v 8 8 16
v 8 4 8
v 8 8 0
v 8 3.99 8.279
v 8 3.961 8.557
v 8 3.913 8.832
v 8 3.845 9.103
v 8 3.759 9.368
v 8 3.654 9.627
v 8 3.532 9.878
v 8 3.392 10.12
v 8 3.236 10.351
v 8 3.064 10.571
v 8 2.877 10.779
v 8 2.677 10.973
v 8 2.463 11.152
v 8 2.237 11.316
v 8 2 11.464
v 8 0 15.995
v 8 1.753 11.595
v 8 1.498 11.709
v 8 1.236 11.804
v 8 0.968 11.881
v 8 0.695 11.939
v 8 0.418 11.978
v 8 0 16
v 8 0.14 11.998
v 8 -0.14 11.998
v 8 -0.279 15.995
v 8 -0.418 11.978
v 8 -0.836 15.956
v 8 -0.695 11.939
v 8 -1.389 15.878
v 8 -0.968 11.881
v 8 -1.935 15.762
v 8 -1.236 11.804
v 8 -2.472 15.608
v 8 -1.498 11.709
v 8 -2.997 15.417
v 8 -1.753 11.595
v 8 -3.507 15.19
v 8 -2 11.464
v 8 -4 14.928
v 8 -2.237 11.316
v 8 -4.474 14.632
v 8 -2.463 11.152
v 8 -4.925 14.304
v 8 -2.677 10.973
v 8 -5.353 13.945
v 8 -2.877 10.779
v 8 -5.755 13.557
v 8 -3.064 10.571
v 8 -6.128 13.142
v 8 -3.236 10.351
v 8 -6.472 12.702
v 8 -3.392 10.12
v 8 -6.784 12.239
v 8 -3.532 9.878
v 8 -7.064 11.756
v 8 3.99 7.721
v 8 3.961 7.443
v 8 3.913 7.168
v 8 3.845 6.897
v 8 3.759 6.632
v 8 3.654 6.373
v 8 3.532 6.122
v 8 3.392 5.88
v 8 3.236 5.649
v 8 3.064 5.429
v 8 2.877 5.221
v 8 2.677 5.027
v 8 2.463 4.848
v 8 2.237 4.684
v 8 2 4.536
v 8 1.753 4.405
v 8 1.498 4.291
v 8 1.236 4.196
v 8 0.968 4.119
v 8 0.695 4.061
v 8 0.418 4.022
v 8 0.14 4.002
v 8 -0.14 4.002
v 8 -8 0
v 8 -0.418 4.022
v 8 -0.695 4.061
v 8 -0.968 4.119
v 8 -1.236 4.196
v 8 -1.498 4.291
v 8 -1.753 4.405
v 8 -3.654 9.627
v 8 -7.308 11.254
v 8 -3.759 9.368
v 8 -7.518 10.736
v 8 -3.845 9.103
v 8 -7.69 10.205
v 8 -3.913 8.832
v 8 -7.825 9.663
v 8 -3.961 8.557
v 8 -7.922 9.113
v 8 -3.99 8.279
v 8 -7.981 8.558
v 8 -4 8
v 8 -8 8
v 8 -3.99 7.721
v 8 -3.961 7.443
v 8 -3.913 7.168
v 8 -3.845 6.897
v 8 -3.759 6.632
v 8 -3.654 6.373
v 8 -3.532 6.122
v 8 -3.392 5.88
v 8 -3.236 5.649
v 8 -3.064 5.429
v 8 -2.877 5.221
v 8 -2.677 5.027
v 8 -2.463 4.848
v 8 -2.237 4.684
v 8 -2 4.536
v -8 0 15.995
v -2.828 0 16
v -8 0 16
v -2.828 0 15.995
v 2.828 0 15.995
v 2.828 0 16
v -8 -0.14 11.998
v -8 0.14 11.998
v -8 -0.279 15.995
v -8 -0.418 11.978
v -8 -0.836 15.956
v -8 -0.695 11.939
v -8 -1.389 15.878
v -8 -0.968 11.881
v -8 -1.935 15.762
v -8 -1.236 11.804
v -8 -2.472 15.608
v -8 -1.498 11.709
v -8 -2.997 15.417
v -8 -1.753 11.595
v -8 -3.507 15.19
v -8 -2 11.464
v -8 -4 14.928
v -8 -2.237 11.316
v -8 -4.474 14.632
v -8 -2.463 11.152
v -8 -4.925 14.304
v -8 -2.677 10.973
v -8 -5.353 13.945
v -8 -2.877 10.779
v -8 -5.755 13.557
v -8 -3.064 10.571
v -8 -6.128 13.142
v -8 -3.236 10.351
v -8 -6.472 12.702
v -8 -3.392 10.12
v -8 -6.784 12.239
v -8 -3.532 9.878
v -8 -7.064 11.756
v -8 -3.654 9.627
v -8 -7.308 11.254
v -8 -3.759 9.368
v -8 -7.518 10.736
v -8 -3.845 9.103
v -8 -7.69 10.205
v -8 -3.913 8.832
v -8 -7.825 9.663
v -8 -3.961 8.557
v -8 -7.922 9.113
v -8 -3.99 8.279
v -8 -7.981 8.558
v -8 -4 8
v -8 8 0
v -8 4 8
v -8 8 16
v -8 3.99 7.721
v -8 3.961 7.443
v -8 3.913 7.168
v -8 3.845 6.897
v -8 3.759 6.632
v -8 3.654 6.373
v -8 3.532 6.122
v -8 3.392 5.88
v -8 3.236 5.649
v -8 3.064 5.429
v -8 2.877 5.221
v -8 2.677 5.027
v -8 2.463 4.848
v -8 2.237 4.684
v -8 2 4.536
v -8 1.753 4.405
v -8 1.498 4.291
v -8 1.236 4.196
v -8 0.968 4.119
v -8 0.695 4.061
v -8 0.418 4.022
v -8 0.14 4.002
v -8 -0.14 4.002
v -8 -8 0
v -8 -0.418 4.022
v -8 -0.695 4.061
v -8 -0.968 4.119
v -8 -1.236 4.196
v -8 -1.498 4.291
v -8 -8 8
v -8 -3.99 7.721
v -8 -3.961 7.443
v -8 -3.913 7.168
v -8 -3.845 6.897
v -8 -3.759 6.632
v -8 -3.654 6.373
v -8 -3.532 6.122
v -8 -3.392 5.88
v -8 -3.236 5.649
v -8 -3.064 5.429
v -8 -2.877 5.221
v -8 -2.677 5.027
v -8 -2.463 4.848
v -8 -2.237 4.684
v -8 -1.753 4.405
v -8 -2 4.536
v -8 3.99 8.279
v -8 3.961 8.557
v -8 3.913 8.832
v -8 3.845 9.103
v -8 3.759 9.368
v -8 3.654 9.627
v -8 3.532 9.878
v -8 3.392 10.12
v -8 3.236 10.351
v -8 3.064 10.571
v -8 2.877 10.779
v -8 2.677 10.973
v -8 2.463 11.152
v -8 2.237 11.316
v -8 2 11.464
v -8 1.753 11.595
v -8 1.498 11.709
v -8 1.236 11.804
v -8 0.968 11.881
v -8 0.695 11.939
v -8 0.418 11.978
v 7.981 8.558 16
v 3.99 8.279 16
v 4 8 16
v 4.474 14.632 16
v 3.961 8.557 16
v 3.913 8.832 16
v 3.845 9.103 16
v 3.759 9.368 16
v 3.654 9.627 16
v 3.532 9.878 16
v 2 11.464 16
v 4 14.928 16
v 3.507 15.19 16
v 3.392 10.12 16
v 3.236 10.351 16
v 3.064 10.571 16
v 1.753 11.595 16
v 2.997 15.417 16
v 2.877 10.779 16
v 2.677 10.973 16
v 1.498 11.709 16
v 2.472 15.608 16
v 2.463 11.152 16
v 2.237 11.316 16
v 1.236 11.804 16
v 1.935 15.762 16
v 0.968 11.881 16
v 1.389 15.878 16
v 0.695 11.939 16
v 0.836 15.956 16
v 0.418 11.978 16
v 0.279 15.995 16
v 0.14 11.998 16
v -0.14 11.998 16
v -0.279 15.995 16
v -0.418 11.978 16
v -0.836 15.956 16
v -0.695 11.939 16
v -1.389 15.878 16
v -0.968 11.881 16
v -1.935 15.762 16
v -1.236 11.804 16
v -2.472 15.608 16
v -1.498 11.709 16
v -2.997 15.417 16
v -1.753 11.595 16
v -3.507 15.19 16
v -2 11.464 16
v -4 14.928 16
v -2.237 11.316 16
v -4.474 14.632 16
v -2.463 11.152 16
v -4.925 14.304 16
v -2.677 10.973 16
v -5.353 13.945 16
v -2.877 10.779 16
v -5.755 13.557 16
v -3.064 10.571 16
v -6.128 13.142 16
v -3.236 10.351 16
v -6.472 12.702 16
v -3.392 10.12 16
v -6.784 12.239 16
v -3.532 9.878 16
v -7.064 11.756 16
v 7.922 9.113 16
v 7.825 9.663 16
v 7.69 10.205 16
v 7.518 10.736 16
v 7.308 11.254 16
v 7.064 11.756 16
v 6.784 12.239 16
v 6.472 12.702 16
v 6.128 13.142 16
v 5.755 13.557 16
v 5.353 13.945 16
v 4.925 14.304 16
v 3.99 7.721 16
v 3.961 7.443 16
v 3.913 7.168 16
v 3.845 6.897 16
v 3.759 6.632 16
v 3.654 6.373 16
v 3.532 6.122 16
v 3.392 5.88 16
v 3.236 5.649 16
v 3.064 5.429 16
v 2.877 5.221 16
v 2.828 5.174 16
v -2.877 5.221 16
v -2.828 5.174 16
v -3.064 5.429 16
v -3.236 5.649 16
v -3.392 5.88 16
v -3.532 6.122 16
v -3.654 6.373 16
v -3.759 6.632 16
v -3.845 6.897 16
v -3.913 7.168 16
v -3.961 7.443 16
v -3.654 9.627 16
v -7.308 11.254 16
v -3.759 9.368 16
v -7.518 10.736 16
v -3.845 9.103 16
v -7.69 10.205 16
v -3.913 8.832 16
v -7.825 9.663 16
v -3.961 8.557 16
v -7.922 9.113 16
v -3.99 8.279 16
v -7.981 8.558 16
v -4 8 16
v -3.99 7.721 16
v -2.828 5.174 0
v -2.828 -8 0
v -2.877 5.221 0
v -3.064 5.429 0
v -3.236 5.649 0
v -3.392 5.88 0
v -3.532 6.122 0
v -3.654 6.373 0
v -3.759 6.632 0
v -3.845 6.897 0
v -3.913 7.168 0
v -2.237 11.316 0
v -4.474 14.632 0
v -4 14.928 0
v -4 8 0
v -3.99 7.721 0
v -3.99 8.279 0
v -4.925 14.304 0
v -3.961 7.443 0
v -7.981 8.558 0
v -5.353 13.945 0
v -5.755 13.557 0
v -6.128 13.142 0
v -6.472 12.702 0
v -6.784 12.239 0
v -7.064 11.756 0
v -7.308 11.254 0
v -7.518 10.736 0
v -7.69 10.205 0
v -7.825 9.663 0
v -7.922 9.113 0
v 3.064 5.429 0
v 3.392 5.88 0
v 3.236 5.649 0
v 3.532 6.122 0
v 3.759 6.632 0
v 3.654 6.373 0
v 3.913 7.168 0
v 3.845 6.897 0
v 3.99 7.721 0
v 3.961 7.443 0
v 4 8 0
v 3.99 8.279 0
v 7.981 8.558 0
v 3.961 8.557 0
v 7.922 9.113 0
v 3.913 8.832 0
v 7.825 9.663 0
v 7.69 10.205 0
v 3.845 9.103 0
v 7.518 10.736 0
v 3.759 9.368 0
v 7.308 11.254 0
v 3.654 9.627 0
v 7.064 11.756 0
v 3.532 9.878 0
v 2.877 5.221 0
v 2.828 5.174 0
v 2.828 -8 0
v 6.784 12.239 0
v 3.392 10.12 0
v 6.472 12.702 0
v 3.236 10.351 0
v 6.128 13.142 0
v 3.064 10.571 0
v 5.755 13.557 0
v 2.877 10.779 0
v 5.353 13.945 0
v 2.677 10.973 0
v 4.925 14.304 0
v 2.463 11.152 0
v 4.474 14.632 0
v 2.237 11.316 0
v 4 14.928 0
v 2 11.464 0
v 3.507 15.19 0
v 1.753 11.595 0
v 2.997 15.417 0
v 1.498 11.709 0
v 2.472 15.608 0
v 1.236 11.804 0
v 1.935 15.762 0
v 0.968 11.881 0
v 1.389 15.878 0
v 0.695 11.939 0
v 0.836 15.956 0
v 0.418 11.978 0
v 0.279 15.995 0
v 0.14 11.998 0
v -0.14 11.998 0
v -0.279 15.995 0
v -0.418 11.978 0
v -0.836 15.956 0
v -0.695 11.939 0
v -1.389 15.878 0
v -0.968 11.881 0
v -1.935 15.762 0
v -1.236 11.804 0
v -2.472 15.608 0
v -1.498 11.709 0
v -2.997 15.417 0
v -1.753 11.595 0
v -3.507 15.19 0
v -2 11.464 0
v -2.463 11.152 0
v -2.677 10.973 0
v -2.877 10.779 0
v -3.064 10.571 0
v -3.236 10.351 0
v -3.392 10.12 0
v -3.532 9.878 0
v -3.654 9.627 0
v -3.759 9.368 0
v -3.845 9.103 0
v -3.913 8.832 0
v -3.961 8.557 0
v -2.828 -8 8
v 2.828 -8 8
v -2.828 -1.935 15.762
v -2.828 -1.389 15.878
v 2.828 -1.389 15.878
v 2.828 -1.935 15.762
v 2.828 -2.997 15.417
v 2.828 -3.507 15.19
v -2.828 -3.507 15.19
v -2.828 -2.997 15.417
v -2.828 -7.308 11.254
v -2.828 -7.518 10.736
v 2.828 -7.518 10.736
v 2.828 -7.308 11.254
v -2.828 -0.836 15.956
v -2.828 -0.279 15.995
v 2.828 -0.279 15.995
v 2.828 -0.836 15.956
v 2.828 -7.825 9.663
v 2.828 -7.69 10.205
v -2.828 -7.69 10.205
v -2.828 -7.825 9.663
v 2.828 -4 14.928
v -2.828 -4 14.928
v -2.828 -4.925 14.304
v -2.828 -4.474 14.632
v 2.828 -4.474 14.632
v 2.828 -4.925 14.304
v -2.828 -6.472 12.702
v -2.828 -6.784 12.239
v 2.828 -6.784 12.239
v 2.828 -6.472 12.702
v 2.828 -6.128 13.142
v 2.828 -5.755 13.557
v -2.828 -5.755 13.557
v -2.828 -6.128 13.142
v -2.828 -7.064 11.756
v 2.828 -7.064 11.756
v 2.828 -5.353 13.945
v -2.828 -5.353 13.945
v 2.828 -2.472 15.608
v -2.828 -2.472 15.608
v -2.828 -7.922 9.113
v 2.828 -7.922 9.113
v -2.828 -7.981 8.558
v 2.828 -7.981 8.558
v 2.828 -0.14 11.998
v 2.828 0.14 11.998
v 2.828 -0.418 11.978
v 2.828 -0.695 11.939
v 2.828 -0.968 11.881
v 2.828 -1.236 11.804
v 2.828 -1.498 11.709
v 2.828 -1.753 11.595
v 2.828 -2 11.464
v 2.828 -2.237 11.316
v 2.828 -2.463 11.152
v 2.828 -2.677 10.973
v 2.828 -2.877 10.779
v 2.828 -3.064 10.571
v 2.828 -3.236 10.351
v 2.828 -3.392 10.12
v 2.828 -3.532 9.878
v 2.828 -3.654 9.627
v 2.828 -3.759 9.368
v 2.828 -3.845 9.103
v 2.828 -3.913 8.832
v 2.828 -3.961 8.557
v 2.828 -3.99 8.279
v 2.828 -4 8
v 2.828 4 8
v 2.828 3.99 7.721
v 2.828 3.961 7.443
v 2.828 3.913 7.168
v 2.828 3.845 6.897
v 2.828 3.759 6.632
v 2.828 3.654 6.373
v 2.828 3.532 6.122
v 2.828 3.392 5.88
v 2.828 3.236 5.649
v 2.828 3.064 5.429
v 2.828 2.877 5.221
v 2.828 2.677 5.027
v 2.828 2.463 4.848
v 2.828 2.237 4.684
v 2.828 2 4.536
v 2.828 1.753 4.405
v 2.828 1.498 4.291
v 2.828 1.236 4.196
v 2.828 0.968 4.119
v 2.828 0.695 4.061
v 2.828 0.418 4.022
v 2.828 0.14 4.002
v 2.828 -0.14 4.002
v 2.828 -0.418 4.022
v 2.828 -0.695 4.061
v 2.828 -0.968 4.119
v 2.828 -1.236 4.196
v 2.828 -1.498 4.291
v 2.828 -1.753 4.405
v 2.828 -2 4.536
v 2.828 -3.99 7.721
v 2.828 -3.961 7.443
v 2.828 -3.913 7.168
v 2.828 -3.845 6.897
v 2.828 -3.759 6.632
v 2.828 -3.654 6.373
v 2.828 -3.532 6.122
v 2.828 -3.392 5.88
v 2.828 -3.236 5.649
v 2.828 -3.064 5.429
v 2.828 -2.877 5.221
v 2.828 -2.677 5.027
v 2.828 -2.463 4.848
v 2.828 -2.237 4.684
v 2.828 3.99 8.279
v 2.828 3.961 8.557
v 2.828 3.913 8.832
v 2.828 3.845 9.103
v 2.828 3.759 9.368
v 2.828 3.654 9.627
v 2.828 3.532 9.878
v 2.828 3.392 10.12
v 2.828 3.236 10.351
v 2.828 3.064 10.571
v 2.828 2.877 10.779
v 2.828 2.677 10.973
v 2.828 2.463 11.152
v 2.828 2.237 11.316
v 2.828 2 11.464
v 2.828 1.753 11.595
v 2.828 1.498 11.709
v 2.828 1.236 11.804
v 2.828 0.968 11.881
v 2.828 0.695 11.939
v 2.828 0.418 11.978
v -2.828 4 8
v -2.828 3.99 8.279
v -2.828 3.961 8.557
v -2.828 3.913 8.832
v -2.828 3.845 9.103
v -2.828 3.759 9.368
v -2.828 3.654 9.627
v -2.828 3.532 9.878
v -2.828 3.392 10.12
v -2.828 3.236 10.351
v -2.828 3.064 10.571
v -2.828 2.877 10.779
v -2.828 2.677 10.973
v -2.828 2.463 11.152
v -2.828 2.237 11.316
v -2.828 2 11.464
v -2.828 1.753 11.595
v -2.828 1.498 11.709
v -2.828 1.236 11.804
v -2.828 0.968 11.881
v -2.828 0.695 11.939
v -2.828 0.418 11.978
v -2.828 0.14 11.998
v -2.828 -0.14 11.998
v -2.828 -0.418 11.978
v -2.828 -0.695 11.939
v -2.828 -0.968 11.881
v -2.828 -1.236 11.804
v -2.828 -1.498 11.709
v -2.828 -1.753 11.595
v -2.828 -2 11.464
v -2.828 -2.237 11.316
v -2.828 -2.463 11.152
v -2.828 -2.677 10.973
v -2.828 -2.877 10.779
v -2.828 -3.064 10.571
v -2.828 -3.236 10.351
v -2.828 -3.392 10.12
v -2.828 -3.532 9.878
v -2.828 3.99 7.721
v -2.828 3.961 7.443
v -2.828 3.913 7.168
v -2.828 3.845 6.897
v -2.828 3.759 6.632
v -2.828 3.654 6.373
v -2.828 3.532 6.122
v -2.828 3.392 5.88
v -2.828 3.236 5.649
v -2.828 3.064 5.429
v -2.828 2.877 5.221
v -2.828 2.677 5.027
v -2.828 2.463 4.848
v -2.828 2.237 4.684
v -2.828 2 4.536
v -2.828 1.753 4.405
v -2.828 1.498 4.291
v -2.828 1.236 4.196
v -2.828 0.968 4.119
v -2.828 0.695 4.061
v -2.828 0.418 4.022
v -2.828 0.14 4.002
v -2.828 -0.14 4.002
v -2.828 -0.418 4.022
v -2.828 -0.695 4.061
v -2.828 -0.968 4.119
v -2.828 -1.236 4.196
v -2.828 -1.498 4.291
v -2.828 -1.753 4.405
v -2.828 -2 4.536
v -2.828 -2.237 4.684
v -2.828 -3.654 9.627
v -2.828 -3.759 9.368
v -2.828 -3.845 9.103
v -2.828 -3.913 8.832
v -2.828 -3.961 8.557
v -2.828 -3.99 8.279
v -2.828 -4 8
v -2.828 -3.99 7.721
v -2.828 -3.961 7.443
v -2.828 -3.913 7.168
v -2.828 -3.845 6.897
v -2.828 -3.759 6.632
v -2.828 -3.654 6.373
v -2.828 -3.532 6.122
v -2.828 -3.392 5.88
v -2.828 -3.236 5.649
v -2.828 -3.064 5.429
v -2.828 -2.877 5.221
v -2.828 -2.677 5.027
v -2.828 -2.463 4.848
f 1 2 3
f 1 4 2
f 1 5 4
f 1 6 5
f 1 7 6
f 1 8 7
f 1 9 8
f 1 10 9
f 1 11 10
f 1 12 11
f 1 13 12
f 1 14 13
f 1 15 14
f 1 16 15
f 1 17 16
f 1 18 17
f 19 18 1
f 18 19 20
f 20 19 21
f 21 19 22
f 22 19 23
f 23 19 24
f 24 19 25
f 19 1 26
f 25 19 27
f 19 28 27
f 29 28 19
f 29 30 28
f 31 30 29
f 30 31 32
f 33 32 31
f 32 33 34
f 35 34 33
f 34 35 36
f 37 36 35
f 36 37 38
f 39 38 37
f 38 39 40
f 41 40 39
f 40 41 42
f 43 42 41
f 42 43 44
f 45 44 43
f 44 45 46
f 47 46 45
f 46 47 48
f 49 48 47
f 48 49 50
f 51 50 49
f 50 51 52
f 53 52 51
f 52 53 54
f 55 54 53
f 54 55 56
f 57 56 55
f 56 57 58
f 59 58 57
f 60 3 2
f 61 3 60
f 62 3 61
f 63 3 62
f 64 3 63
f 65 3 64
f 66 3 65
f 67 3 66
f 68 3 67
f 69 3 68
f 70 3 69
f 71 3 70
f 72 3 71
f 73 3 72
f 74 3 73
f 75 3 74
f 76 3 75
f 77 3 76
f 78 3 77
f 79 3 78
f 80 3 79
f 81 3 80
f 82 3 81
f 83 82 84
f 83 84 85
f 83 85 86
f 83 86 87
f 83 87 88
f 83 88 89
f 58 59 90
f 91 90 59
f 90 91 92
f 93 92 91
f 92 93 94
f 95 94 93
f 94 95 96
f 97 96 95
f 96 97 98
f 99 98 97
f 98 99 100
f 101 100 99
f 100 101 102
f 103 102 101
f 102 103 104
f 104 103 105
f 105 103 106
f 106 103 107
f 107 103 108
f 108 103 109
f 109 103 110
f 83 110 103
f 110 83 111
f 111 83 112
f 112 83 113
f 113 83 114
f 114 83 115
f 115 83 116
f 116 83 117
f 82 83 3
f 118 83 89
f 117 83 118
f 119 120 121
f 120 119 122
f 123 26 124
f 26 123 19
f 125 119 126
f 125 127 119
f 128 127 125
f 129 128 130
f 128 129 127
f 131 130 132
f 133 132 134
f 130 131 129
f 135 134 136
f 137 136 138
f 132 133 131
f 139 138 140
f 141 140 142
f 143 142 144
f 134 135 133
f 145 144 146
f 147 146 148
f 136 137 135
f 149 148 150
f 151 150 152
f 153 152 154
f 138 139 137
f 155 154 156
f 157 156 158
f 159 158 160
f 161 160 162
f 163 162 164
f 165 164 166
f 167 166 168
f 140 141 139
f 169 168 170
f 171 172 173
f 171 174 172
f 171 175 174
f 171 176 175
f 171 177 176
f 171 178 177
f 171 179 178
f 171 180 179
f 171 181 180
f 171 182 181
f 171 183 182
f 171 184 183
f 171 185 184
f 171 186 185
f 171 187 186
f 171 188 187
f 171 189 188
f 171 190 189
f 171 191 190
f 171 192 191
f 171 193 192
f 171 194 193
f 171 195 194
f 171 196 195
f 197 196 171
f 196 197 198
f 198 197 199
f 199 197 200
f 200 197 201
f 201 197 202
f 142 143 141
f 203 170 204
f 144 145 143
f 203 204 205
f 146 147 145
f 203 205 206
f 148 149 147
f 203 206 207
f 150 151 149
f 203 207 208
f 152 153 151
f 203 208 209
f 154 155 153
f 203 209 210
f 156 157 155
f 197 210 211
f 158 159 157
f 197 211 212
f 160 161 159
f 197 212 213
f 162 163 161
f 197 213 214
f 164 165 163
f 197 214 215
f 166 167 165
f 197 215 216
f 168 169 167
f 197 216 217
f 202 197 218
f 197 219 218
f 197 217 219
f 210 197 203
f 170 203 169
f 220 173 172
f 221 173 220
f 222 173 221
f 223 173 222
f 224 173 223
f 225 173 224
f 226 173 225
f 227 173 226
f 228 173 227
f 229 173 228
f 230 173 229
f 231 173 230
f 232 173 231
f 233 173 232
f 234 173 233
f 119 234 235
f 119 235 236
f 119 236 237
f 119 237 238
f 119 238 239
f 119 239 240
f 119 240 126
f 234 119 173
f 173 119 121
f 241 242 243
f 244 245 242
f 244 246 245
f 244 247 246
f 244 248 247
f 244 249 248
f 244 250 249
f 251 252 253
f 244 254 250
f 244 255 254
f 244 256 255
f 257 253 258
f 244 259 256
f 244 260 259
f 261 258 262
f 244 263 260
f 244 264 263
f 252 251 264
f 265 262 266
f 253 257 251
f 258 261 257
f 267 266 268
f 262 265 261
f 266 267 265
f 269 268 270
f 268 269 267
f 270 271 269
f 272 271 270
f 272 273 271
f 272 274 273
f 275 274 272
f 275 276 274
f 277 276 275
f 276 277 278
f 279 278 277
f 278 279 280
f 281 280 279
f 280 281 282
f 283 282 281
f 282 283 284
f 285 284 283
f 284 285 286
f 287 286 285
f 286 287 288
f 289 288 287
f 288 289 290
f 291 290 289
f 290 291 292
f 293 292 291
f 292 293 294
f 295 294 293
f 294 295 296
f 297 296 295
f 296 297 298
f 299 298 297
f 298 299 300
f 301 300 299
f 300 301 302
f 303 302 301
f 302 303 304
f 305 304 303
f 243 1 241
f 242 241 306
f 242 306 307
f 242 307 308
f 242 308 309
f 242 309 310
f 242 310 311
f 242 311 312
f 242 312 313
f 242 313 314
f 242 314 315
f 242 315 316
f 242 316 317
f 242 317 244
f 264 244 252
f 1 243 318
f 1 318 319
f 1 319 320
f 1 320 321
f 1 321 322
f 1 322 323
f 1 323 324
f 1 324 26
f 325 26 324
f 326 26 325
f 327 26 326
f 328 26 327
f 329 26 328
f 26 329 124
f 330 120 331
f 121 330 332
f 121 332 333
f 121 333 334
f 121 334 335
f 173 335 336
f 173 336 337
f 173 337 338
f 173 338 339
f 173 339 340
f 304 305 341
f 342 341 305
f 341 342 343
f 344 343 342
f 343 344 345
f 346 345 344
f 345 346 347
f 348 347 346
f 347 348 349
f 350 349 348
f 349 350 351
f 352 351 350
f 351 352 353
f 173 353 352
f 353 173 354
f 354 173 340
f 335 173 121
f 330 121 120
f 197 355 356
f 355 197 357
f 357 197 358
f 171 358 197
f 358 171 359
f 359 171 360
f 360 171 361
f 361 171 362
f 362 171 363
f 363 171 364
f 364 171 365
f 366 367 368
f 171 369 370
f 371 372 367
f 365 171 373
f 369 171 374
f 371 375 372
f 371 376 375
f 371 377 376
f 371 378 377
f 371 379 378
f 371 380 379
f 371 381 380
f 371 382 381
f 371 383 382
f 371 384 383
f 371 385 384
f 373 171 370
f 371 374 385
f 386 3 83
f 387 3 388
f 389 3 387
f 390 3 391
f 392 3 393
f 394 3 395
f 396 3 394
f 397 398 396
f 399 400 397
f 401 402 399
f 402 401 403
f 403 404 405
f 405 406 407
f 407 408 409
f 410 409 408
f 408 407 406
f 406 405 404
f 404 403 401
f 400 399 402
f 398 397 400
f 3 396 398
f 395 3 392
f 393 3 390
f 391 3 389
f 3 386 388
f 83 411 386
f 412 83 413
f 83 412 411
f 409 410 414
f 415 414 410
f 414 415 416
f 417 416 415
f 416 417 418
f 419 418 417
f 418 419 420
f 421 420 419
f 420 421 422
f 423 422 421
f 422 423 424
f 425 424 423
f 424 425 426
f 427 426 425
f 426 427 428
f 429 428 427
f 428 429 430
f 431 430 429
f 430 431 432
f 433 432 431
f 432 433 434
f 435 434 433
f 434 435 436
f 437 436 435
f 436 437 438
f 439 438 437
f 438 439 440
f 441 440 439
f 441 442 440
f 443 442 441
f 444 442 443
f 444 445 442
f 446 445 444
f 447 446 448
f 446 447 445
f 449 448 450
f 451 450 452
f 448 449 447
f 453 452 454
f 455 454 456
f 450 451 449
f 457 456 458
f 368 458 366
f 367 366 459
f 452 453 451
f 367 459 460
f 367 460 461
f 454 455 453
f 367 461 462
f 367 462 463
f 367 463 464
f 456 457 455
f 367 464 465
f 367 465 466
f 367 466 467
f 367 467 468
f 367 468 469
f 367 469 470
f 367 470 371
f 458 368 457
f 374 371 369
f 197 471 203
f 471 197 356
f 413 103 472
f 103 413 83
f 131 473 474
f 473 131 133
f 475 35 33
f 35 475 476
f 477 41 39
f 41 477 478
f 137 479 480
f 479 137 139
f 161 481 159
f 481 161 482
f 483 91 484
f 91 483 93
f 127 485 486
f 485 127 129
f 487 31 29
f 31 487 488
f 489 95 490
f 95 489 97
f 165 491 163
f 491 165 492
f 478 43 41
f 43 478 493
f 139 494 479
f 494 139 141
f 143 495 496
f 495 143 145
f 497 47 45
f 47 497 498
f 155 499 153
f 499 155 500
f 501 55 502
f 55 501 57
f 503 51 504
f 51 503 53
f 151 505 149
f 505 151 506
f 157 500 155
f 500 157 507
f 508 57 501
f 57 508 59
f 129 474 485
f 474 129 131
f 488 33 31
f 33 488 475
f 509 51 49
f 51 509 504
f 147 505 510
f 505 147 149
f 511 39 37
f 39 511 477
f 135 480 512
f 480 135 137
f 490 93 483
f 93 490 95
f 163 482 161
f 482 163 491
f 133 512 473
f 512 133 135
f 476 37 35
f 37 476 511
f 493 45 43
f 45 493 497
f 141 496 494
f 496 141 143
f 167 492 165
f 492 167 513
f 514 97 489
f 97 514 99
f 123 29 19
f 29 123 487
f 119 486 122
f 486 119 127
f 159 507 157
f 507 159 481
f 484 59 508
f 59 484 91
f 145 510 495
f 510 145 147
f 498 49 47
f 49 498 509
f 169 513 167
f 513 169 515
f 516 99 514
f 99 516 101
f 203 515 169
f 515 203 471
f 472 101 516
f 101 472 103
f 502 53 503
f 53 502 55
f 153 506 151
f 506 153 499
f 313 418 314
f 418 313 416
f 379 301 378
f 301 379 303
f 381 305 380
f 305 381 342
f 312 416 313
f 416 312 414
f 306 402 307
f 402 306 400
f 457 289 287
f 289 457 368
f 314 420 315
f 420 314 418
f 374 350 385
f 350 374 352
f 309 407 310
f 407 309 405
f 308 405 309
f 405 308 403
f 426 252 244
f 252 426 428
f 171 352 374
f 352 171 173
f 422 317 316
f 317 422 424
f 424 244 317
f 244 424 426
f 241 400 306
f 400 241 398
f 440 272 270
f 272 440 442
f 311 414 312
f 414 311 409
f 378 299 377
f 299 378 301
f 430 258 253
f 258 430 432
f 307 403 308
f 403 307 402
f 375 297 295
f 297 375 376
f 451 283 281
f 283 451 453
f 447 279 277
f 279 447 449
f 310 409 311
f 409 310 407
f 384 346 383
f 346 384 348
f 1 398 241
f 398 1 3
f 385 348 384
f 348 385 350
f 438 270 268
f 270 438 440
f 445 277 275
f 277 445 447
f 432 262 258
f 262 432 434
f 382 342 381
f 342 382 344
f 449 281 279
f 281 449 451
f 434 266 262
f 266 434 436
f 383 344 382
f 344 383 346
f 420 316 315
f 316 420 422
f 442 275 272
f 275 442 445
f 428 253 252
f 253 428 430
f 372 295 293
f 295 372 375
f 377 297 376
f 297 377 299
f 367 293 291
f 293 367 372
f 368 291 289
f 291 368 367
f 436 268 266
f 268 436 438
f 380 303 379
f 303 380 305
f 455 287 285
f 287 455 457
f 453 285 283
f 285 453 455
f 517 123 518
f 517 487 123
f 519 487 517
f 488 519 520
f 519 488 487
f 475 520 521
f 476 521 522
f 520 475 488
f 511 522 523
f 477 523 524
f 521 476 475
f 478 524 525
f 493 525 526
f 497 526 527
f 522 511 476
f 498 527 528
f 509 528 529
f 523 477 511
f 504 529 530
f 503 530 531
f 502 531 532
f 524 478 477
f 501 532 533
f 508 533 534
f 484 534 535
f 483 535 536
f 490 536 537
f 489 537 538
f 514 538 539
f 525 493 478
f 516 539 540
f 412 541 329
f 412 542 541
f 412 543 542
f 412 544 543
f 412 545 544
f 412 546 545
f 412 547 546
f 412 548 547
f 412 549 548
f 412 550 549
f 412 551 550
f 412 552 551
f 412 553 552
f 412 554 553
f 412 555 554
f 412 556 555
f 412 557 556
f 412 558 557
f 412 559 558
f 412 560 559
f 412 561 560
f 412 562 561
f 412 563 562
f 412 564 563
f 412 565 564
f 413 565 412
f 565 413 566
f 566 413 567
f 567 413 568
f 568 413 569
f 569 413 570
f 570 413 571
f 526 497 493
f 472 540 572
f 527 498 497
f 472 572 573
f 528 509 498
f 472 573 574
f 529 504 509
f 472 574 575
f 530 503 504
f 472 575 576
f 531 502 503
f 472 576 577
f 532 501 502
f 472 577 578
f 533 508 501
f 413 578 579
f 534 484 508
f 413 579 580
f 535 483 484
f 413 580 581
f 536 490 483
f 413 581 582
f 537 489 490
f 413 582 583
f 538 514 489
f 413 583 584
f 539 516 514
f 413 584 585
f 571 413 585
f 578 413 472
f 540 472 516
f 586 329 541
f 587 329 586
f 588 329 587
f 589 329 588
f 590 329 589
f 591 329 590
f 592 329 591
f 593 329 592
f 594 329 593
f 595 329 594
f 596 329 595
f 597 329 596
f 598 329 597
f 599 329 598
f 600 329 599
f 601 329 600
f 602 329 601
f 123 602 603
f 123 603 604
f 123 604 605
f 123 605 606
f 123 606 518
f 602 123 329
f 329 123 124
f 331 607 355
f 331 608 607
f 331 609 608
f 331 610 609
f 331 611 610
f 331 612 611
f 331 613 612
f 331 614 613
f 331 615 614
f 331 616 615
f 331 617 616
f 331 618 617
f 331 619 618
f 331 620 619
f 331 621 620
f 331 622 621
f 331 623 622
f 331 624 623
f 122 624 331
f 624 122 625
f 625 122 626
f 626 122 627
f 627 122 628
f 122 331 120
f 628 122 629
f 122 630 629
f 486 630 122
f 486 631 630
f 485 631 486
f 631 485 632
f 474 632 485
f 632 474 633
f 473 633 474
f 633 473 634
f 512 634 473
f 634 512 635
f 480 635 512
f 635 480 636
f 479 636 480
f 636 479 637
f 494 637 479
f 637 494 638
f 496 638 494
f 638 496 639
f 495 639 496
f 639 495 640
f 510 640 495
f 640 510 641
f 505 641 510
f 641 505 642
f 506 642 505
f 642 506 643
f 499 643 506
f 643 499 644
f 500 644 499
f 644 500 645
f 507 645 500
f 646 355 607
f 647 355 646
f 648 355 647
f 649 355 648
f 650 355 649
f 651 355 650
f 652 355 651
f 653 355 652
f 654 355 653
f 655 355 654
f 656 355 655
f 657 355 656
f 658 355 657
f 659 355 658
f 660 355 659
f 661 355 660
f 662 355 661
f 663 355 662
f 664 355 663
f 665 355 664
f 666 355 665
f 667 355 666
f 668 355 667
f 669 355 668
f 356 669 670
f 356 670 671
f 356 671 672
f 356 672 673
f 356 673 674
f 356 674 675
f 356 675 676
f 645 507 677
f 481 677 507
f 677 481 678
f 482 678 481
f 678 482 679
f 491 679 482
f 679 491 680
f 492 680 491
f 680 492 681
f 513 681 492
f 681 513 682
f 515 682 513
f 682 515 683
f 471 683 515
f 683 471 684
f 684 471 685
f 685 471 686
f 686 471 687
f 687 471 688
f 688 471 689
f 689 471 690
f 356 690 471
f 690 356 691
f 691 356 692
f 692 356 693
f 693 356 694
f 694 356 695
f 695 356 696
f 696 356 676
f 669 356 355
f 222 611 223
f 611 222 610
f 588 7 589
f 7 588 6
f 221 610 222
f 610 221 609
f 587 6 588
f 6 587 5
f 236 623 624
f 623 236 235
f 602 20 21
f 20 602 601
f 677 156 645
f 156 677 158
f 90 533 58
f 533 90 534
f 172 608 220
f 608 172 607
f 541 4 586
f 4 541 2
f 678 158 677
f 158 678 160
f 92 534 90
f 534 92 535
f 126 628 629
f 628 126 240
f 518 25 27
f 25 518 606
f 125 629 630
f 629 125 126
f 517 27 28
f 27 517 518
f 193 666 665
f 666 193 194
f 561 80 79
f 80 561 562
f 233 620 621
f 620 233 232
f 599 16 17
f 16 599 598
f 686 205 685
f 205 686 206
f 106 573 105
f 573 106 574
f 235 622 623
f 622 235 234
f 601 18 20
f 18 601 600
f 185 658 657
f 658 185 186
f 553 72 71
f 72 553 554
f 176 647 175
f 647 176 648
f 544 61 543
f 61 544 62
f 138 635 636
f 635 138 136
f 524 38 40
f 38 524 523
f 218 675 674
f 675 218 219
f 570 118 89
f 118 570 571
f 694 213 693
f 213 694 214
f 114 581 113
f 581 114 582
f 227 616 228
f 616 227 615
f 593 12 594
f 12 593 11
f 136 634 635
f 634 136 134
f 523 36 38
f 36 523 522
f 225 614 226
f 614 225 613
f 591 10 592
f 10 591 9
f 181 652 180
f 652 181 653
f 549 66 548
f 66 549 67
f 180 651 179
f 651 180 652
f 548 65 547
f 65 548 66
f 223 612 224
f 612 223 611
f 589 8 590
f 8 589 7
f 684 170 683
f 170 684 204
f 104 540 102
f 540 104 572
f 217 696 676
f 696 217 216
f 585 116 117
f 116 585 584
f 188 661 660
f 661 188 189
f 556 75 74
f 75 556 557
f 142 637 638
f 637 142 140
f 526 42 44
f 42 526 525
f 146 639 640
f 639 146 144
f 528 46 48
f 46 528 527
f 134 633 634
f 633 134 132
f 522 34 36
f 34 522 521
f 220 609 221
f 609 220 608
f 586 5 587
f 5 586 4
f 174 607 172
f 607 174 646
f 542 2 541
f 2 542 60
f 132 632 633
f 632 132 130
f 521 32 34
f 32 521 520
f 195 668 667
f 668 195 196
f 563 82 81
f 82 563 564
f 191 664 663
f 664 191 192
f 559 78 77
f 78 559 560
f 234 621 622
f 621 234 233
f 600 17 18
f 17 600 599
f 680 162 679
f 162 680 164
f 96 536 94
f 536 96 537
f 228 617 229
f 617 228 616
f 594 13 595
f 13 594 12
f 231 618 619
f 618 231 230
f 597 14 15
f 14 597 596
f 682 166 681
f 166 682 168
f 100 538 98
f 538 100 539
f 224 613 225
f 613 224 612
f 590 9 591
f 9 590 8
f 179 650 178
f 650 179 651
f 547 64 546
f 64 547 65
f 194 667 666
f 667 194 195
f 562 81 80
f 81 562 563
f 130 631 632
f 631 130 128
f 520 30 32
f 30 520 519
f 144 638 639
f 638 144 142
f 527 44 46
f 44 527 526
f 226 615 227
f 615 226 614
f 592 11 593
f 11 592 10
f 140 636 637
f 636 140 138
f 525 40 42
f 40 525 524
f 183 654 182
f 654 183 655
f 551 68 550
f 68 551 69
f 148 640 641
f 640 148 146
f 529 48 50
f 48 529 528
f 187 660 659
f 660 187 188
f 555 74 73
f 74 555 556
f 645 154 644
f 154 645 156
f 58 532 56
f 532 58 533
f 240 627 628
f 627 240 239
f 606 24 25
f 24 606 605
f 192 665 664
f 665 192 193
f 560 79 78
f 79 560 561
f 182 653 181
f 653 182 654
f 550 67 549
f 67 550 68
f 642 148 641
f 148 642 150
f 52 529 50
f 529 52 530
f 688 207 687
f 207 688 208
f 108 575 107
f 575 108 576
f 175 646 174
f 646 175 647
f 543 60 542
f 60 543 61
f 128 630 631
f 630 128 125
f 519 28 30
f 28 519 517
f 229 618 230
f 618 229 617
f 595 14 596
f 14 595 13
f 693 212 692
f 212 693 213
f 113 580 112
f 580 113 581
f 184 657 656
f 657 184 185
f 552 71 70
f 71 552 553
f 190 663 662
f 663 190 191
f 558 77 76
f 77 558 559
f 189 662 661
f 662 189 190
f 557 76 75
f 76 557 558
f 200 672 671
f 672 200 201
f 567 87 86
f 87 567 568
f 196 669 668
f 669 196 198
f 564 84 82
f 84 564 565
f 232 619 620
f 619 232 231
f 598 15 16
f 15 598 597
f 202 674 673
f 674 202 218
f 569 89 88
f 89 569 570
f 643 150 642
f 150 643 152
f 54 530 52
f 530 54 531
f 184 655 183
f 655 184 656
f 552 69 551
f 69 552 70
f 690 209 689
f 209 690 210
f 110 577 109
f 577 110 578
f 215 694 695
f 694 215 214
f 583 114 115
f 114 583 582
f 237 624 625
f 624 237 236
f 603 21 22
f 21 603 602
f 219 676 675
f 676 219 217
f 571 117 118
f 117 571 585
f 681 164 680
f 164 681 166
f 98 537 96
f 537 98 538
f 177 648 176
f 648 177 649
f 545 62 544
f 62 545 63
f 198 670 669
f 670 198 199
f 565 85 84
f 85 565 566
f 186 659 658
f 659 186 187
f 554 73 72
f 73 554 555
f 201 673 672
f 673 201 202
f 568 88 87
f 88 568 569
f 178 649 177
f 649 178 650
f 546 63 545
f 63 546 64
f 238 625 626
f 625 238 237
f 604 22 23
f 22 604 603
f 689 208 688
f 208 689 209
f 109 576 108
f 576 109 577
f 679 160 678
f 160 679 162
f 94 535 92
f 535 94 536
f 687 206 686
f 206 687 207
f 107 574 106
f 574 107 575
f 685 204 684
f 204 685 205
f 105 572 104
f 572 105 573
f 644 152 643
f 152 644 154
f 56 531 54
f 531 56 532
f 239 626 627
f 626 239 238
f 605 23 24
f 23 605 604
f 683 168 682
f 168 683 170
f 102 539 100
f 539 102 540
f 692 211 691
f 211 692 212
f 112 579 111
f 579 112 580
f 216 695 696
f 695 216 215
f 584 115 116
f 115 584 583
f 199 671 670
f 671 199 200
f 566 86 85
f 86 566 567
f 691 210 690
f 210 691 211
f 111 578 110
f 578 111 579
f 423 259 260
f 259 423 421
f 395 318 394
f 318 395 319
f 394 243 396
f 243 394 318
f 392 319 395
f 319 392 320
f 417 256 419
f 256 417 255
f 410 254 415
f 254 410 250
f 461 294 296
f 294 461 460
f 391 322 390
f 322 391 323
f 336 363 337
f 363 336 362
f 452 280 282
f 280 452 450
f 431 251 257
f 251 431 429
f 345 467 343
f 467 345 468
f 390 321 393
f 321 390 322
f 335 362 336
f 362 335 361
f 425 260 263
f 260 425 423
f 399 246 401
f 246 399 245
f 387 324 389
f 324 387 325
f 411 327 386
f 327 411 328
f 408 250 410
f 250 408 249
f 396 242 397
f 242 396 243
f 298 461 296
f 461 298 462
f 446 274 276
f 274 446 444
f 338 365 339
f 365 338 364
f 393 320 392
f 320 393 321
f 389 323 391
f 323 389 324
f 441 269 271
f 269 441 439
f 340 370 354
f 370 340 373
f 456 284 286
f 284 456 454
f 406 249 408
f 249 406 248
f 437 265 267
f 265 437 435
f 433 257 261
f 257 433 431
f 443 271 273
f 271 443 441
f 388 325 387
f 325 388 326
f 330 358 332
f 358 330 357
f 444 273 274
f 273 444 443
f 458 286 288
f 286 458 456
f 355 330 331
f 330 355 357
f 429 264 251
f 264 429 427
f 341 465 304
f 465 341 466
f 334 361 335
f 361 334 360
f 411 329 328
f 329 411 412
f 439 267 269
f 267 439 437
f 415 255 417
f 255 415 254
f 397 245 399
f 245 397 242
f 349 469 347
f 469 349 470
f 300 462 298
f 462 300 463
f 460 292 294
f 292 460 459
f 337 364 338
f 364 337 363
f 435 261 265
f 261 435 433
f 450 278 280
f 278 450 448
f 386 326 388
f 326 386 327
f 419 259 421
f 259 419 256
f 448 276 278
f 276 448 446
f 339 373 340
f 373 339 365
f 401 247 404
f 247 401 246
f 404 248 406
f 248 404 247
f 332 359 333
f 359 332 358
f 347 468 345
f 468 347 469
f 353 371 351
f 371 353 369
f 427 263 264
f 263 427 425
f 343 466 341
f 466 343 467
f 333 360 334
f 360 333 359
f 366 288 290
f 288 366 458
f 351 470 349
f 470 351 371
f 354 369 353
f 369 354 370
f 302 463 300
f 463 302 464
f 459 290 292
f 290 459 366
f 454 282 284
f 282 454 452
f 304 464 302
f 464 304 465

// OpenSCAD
rodsize = 8;
fn = 90;

partthick = rodsize * 2;

module rod(length) cylinder(h = length, r = rodsize / 2, center = true, $fn = fn);

module ybar_clamp() difference() {
	union() {
		translate([0, 0, -rodsize / 2]) cube([partthick, partthick, rodsize], center = true);
		translate([0, -partthick / 4, partthick / 4]) cube([partthick, partthick / 2, partthick / 2], center = true);
		rotate([0, 90, 0]) cylinder(h = partthick, r = partthick / 2, center = true, $fn = fn);
		translate([0, 0, -rodsize]) rotate([90, 0, 0]) cylinder(h = partthick, r = partthick / 2, center = true, $fn = fn);
	}
	translate([0, 0, partthick - rodsize]) cube([rodsize * sin(45), partthick * 2, partthick * 2], center = true);
	rotate([0, 90, 0]) rod(partthick + 1);
	translate([0, 0, -rodsize]) rotate([90, 0, 0]) rod(partthick + 1);
}

translate([0, 0, partthick / 2]) rotate([90, 0, 0]) ybar_clamp();
